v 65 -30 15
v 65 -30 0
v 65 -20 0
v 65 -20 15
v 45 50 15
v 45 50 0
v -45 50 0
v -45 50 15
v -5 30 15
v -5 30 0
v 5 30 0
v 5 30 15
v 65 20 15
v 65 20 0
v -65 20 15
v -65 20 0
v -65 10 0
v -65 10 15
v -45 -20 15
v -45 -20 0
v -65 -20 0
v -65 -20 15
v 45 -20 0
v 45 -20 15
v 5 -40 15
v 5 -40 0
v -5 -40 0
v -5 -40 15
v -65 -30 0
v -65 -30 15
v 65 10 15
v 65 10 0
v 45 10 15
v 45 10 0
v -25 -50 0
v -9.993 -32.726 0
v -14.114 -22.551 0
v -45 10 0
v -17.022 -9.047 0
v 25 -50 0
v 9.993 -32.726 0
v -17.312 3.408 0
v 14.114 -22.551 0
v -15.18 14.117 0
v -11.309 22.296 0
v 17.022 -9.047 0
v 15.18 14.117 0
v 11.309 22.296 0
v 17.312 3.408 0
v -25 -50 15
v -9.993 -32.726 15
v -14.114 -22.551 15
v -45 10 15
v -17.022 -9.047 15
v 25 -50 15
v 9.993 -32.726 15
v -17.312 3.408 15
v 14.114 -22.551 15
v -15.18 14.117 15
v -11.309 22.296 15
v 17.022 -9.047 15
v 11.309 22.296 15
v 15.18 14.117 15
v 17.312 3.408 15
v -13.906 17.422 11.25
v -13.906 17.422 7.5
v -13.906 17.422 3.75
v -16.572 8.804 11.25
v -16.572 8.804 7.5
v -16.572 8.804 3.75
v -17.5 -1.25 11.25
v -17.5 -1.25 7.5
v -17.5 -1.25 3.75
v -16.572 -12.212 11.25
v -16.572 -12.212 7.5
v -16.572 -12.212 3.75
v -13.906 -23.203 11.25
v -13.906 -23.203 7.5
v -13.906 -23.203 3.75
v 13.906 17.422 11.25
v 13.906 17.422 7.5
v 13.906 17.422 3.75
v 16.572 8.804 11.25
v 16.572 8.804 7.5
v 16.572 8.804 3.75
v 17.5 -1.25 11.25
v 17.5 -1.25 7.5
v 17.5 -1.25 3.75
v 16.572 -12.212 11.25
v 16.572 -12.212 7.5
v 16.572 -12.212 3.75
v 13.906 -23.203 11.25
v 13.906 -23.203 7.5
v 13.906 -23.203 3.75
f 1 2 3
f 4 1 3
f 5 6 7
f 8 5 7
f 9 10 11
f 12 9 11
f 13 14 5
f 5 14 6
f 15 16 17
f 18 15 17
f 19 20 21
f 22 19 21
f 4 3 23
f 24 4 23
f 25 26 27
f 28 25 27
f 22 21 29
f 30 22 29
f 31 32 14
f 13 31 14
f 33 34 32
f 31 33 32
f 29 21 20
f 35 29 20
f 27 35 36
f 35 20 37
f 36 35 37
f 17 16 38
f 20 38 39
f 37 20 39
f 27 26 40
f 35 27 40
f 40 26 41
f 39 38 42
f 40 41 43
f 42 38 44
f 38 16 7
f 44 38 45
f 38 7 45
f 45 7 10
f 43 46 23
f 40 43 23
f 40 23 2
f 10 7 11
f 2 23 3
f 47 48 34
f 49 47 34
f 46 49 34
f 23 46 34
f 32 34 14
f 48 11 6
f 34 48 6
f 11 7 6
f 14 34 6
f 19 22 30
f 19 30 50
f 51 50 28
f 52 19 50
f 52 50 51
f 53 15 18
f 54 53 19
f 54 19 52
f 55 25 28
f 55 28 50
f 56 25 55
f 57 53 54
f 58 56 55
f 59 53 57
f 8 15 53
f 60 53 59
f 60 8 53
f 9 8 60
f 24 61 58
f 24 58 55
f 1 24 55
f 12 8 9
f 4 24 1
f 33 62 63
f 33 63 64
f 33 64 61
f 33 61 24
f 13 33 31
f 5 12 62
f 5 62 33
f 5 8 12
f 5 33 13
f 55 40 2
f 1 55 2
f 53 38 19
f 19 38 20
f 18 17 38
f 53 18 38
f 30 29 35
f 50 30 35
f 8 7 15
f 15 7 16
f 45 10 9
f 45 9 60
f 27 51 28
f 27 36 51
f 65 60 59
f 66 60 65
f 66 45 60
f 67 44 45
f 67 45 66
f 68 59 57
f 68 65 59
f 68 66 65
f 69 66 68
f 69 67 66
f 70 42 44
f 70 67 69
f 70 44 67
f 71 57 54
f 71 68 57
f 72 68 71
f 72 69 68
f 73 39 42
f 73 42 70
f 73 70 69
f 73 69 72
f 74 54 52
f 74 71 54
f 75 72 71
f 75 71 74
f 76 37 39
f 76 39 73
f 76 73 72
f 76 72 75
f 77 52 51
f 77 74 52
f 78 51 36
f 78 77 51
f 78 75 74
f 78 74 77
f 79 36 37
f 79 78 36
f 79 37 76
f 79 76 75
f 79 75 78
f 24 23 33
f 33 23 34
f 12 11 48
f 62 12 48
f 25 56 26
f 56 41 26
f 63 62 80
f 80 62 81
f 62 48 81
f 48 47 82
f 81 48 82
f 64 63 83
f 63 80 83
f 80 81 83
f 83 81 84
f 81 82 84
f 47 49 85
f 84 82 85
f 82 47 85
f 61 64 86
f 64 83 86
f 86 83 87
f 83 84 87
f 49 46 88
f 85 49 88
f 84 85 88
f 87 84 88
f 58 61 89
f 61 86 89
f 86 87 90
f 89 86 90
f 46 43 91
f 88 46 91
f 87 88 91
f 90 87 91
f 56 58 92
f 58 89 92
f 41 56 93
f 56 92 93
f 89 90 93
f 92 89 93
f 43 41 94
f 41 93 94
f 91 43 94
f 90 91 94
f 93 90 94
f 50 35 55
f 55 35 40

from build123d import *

# Parameters (mm, degrees)
BOSS_EXTRUDE1_DEPTH = 15


with BuildPart() as part:
    # Sketch1 → Boss-Extrude1 (new body)
    with BuildSketch(Plane.XY):
        Polygon((45, 50), (-45, 50), (-65, 20), (-65, 10), (-45, 10), (-45, -20), (-65, -20), (-65, -30), (-25, -50), (25, -50), (65, -30), (65, -20), (45, -20), (45, 10), (65, 10), (65, 20), align=None)
        with BuildLine():
            Line((-5, 30), (5, 30))
            add(Edge.make_bspline(
                [(5, 30), (15, 20), (25, 5), (15, -30), (5, -40)],
                knots=[0, 0, 0, 0, 0, 1, 1, 1, 1, 1], degree=4))
            Line((5, -40), (-5, -40))
            add(Edge.make_bspline(
                [(-5, 30), (-15, 20), (-25, 5), (-15, -30), (-5, -40)],
                knots=[0, 0, 0, 0, 0, 1, 1, 1, 1, 1], degree=4))
        make_face(mode=Mode.SUBTRACT)
    extrude(amount=BOSS_EXTRUDE1_DEPTH)


solid = part.part
